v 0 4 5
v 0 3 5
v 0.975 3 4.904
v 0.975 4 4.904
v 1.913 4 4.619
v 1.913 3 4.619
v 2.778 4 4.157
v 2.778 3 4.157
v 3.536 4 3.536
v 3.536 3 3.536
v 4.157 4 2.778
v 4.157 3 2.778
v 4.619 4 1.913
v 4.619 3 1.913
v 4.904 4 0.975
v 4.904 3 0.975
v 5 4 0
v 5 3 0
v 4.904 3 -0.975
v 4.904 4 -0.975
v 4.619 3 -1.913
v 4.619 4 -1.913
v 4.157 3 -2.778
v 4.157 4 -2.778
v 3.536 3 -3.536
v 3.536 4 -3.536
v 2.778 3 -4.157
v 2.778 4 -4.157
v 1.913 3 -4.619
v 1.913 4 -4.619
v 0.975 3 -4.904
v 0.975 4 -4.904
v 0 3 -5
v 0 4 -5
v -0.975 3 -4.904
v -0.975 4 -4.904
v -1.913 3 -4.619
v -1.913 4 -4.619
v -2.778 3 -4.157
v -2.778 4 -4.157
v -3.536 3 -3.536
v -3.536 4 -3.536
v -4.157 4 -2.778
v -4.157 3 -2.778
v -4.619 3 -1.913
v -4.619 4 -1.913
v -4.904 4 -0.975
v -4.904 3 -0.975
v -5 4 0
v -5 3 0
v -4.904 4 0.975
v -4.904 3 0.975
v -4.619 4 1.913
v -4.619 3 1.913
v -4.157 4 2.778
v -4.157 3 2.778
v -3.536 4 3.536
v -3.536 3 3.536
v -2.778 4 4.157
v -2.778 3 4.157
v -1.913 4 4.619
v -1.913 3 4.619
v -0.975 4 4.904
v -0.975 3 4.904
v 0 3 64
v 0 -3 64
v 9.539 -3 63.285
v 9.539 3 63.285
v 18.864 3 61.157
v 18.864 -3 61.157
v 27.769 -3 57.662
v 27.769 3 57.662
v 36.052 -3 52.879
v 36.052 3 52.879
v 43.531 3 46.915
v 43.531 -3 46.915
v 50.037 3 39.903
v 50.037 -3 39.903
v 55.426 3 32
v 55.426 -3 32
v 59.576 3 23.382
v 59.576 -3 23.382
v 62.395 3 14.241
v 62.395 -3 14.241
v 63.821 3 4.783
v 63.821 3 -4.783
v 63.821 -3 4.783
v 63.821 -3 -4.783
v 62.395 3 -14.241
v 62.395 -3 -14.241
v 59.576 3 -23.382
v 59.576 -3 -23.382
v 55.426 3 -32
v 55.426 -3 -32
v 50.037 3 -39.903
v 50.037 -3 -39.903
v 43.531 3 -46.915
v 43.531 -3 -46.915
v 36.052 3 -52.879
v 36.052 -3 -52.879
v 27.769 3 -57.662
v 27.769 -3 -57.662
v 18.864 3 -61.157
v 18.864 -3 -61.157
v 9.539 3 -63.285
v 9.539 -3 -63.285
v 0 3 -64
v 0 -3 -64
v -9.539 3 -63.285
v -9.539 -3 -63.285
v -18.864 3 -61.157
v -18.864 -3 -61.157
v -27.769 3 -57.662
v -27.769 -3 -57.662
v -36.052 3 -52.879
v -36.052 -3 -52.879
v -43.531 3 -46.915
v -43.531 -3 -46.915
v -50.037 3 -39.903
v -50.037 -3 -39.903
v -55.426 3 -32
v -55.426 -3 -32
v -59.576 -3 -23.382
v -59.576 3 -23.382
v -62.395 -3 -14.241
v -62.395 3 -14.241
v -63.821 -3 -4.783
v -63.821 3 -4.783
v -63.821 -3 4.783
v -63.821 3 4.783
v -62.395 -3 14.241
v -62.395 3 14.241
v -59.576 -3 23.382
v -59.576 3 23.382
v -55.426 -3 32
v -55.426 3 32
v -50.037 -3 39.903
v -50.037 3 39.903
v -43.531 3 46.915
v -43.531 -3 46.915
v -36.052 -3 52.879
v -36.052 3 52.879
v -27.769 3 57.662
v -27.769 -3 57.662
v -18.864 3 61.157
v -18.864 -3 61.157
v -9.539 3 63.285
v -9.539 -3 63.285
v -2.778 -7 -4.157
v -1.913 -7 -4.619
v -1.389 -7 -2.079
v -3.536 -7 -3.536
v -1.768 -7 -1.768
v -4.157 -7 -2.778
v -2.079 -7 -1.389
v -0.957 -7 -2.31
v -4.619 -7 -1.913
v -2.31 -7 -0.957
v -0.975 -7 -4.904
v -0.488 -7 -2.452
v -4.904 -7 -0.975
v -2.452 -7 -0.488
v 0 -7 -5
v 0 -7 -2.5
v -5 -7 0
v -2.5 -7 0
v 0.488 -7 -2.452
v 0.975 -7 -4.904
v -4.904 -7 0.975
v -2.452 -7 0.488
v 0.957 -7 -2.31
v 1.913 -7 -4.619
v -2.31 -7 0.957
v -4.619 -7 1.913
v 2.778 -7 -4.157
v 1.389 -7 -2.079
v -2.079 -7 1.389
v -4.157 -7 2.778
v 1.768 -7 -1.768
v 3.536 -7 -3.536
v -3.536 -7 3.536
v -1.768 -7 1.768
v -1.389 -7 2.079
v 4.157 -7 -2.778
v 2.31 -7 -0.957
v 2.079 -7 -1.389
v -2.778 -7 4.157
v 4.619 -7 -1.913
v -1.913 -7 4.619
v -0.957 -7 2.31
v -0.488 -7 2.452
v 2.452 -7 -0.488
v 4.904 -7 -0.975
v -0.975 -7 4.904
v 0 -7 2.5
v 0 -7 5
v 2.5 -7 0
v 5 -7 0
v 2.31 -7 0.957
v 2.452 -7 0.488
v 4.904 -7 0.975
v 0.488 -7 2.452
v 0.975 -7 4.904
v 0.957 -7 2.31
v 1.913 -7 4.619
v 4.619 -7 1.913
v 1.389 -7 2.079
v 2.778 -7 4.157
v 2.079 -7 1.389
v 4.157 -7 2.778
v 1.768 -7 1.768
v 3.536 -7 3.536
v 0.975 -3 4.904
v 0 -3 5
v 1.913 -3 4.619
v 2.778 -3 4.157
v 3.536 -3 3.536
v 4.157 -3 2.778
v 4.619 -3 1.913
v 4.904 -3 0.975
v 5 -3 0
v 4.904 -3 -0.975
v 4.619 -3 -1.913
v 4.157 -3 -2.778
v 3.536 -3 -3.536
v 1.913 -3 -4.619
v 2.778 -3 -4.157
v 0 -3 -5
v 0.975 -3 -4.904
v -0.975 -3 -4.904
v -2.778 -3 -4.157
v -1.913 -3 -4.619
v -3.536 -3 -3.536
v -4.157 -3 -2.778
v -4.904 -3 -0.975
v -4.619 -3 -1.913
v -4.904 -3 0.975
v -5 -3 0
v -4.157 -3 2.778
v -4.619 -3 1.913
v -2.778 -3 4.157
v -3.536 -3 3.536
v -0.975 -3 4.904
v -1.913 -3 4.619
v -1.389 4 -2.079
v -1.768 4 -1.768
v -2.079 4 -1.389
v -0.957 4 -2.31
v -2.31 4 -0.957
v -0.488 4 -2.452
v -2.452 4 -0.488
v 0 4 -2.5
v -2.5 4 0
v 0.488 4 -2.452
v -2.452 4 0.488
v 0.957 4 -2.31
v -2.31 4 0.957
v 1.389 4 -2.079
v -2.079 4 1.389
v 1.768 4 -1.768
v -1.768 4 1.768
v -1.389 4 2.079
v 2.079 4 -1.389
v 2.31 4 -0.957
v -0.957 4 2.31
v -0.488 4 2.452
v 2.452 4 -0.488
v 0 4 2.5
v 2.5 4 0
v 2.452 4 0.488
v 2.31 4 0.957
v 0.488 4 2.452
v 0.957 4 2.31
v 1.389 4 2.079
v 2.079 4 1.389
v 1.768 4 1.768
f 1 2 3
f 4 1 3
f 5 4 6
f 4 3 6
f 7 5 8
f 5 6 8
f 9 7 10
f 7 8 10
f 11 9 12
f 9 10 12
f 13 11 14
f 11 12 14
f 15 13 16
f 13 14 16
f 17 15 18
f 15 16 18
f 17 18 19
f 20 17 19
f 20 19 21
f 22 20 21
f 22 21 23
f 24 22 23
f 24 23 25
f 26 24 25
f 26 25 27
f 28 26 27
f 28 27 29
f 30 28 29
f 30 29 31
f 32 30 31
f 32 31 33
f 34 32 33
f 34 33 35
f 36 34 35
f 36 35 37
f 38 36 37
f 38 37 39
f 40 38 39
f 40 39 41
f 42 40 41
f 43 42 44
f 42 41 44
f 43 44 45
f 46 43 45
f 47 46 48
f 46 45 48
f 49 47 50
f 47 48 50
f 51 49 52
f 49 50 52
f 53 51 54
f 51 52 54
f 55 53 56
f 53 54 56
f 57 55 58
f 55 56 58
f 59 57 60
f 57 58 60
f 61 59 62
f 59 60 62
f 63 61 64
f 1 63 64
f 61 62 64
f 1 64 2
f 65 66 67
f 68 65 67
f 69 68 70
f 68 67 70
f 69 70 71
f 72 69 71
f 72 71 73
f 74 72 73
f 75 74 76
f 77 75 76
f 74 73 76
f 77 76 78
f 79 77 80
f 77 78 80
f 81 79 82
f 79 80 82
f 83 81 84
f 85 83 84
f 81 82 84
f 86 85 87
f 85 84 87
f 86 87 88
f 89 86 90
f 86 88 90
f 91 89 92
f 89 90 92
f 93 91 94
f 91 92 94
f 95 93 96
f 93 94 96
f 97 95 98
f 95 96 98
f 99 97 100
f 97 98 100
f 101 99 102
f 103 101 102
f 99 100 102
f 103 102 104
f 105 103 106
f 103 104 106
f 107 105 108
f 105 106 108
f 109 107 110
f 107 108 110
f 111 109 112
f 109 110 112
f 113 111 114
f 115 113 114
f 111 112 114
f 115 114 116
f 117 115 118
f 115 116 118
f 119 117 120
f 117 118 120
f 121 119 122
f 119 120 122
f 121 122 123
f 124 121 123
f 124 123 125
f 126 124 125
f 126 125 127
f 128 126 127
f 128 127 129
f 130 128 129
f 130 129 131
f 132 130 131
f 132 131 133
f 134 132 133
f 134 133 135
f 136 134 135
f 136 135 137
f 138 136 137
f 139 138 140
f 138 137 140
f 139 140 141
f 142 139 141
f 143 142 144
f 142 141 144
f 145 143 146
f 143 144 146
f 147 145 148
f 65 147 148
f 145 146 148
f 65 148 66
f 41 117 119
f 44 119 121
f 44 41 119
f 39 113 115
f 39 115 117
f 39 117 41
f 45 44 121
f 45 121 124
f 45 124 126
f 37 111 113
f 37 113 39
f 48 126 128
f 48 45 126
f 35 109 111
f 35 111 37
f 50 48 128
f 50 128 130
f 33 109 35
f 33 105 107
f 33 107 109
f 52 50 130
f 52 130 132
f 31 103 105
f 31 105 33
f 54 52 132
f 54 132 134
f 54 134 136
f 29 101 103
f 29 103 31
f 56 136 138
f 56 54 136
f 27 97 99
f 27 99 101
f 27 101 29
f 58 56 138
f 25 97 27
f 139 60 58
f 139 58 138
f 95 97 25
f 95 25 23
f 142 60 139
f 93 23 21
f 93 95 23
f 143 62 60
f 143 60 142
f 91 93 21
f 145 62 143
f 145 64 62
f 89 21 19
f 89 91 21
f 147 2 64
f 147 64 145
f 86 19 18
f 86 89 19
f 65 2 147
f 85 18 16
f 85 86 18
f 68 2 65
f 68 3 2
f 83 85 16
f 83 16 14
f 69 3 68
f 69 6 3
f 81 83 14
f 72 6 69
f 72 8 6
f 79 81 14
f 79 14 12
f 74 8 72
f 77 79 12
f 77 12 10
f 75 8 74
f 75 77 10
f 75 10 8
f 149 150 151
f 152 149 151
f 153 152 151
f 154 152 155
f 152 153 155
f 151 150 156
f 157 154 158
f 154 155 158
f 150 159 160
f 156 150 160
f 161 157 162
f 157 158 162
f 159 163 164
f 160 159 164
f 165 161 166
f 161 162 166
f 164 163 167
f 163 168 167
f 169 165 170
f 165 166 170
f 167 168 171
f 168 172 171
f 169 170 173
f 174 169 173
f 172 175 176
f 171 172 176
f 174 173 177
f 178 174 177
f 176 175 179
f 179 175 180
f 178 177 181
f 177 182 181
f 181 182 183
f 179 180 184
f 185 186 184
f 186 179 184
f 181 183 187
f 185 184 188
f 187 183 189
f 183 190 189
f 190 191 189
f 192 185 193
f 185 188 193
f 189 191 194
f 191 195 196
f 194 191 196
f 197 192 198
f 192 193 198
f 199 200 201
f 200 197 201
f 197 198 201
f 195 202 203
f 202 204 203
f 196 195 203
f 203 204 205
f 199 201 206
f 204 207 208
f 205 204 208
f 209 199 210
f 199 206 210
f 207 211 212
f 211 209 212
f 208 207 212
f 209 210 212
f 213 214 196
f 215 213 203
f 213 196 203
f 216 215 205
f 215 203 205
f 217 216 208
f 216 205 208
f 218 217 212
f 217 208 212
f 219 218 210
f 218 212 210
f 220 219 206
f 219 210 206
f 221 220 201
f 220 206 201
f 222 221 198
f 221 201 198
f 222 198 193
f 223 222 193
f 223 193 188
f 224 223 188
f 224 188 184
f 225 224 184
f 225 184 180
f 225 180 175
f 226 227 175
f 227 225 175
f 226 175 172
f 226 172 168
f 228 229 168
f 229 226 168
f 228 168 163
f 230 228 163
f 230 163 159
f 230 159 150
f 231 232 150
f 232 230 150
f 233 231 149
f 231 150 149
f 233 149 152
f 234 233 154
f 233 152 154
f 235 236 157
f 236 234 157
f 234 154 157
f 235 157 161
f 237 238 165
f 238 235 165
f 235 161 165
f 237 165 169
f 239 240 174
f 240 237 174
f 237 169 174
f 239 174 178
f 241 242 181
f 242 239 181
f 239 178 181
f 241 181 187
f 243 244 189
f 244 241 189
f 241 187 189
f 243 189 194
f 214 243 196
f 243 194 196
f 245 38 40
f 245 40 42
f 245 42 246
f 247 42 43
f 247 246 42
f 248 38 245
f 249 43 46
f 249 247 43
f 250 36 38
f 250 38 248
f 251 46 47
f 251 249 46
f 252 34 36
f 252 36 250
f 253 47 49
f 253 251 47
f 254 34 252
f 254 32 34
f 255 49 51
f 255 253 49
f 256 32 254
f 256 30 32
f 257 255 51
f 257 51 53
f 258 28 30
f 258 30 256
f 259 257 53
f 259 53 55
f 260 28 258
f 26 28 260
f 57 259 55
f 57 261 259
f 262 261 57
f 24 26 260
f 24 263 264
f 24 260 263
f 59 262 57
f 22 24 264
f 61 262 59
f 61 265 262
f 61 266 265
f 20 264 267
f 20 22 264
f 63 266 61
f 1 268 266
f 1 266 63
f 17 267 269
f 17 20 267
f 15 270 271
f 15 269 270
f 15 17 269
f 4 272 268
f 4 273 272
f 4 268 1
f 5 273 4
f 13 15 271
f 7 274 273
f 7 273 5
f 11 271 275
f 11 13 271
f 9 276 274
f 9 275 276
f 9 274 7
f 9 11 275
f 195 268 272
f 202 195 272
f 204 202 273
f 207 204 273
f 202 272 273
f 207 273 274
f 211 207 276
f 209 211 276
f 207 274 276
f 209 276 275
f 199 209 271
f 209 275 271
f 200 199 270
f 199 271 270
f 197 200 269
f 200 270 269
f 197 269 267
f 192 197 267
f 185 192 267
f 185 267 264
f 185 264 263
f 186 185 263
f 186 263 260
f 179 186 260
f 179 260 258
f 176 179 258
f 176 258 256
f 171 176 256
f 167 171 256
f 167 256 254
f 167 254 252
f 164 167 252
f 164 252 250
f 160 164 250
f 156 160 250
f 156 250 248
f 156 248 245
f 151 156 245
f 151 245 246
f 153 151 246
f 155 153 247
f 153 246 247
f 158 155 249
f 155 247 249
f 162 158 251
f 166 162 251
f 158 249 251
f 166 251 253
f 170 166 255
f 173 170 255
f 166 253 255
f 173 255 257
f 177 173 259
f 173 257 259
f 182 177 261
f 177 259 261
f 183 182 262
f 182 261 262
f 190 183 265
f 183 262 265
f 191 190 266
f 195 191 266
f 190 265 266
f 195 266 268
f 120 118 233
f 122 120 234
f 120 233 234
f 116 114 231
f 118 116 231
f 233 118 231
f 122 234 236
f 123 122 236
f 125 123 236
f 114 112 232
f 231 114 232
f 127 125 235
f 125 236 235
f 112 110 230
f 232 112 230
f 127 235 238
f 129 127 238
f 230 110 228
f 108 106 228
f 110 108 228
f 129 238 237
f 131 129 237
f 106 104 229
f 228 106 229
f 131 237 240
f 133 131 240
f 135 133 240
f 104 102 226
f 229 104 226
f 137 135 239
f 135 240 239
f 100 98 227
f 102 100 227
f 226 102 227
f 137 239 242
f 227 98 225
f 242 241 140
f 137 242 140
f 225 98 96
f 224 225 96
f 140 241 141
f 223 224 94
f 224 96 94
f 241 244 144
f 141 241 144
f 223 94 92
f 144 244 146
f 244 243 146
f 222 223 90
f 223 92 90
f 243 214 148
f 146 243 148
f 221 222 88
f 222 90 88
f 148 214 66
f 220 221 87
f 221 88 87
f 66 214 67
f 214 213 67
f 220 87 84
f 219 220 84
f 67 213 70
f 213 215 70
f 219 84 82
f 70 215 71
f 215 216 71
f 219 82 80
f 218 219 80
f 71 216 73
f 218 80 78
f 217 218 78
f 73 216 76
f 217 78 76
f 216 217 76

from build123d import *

# Parameters (mm, degrees)
EXTRUDE_1_DEPTH      = 3
EXTRUDE_1_DEPTH_BACK = 3
SKETCH_1_R           = 64
EXTRUDE_2_DEPTH      = 4
EXTRUDE_2_DEPTH_BACK = 7
SKETCH_2_R           = 5
SKETCH_3_R           = 2.5
CUT_EXTRUDE_1_DEPTH  = 92.175654645


with BuildPart() as part:
    # 草图1 → 凸台-拉伸1 (new, two sides: drawn at the far end of the back side and taken through both)
    with BuildSketch(Plane(origin=(0, 0, 0), x_dir=(1, 0, 0), z_dir=(0, 1, 0)).offset(-EXTRUDE_1_DEPTH_BACK)):
        Circle(SKETCH_1_R)
    extrude(amount=EXTRUDE_1_DEPTH + EXTRUDE_1_DEPTH_BACK)

    # 草图2 → 凸台-拉伸2 (add, two sides: drawn at the far end of the back side and taken through both)
    with BuildSketch(Plane(origin=(0, 0, 0), x_dir=(1, 0, 0), z_dir=(0, 1, 0)).offset(-EXTRUDE_2_DEPTH_BACK)):
        Circle(SKETCH_2_R)
    extrude(amount=EXTRUDE_2_DEPTH + EXTRUDE_2_DEPTH_BACK)

    # 草图3 → 切除-拉伸1 (cut, through all)
    with BuildSketch(Plane(origin=(0, 4, 0), x_dir=(1, 0, 0), z_dir=(0, 1, 0))):
        Circle(SKETCH_3_R)
    extrude(amount=-CUT_EXTRUDE_1_DEPTH, mode=Mode.SUBTRACT)


solid = part.part
